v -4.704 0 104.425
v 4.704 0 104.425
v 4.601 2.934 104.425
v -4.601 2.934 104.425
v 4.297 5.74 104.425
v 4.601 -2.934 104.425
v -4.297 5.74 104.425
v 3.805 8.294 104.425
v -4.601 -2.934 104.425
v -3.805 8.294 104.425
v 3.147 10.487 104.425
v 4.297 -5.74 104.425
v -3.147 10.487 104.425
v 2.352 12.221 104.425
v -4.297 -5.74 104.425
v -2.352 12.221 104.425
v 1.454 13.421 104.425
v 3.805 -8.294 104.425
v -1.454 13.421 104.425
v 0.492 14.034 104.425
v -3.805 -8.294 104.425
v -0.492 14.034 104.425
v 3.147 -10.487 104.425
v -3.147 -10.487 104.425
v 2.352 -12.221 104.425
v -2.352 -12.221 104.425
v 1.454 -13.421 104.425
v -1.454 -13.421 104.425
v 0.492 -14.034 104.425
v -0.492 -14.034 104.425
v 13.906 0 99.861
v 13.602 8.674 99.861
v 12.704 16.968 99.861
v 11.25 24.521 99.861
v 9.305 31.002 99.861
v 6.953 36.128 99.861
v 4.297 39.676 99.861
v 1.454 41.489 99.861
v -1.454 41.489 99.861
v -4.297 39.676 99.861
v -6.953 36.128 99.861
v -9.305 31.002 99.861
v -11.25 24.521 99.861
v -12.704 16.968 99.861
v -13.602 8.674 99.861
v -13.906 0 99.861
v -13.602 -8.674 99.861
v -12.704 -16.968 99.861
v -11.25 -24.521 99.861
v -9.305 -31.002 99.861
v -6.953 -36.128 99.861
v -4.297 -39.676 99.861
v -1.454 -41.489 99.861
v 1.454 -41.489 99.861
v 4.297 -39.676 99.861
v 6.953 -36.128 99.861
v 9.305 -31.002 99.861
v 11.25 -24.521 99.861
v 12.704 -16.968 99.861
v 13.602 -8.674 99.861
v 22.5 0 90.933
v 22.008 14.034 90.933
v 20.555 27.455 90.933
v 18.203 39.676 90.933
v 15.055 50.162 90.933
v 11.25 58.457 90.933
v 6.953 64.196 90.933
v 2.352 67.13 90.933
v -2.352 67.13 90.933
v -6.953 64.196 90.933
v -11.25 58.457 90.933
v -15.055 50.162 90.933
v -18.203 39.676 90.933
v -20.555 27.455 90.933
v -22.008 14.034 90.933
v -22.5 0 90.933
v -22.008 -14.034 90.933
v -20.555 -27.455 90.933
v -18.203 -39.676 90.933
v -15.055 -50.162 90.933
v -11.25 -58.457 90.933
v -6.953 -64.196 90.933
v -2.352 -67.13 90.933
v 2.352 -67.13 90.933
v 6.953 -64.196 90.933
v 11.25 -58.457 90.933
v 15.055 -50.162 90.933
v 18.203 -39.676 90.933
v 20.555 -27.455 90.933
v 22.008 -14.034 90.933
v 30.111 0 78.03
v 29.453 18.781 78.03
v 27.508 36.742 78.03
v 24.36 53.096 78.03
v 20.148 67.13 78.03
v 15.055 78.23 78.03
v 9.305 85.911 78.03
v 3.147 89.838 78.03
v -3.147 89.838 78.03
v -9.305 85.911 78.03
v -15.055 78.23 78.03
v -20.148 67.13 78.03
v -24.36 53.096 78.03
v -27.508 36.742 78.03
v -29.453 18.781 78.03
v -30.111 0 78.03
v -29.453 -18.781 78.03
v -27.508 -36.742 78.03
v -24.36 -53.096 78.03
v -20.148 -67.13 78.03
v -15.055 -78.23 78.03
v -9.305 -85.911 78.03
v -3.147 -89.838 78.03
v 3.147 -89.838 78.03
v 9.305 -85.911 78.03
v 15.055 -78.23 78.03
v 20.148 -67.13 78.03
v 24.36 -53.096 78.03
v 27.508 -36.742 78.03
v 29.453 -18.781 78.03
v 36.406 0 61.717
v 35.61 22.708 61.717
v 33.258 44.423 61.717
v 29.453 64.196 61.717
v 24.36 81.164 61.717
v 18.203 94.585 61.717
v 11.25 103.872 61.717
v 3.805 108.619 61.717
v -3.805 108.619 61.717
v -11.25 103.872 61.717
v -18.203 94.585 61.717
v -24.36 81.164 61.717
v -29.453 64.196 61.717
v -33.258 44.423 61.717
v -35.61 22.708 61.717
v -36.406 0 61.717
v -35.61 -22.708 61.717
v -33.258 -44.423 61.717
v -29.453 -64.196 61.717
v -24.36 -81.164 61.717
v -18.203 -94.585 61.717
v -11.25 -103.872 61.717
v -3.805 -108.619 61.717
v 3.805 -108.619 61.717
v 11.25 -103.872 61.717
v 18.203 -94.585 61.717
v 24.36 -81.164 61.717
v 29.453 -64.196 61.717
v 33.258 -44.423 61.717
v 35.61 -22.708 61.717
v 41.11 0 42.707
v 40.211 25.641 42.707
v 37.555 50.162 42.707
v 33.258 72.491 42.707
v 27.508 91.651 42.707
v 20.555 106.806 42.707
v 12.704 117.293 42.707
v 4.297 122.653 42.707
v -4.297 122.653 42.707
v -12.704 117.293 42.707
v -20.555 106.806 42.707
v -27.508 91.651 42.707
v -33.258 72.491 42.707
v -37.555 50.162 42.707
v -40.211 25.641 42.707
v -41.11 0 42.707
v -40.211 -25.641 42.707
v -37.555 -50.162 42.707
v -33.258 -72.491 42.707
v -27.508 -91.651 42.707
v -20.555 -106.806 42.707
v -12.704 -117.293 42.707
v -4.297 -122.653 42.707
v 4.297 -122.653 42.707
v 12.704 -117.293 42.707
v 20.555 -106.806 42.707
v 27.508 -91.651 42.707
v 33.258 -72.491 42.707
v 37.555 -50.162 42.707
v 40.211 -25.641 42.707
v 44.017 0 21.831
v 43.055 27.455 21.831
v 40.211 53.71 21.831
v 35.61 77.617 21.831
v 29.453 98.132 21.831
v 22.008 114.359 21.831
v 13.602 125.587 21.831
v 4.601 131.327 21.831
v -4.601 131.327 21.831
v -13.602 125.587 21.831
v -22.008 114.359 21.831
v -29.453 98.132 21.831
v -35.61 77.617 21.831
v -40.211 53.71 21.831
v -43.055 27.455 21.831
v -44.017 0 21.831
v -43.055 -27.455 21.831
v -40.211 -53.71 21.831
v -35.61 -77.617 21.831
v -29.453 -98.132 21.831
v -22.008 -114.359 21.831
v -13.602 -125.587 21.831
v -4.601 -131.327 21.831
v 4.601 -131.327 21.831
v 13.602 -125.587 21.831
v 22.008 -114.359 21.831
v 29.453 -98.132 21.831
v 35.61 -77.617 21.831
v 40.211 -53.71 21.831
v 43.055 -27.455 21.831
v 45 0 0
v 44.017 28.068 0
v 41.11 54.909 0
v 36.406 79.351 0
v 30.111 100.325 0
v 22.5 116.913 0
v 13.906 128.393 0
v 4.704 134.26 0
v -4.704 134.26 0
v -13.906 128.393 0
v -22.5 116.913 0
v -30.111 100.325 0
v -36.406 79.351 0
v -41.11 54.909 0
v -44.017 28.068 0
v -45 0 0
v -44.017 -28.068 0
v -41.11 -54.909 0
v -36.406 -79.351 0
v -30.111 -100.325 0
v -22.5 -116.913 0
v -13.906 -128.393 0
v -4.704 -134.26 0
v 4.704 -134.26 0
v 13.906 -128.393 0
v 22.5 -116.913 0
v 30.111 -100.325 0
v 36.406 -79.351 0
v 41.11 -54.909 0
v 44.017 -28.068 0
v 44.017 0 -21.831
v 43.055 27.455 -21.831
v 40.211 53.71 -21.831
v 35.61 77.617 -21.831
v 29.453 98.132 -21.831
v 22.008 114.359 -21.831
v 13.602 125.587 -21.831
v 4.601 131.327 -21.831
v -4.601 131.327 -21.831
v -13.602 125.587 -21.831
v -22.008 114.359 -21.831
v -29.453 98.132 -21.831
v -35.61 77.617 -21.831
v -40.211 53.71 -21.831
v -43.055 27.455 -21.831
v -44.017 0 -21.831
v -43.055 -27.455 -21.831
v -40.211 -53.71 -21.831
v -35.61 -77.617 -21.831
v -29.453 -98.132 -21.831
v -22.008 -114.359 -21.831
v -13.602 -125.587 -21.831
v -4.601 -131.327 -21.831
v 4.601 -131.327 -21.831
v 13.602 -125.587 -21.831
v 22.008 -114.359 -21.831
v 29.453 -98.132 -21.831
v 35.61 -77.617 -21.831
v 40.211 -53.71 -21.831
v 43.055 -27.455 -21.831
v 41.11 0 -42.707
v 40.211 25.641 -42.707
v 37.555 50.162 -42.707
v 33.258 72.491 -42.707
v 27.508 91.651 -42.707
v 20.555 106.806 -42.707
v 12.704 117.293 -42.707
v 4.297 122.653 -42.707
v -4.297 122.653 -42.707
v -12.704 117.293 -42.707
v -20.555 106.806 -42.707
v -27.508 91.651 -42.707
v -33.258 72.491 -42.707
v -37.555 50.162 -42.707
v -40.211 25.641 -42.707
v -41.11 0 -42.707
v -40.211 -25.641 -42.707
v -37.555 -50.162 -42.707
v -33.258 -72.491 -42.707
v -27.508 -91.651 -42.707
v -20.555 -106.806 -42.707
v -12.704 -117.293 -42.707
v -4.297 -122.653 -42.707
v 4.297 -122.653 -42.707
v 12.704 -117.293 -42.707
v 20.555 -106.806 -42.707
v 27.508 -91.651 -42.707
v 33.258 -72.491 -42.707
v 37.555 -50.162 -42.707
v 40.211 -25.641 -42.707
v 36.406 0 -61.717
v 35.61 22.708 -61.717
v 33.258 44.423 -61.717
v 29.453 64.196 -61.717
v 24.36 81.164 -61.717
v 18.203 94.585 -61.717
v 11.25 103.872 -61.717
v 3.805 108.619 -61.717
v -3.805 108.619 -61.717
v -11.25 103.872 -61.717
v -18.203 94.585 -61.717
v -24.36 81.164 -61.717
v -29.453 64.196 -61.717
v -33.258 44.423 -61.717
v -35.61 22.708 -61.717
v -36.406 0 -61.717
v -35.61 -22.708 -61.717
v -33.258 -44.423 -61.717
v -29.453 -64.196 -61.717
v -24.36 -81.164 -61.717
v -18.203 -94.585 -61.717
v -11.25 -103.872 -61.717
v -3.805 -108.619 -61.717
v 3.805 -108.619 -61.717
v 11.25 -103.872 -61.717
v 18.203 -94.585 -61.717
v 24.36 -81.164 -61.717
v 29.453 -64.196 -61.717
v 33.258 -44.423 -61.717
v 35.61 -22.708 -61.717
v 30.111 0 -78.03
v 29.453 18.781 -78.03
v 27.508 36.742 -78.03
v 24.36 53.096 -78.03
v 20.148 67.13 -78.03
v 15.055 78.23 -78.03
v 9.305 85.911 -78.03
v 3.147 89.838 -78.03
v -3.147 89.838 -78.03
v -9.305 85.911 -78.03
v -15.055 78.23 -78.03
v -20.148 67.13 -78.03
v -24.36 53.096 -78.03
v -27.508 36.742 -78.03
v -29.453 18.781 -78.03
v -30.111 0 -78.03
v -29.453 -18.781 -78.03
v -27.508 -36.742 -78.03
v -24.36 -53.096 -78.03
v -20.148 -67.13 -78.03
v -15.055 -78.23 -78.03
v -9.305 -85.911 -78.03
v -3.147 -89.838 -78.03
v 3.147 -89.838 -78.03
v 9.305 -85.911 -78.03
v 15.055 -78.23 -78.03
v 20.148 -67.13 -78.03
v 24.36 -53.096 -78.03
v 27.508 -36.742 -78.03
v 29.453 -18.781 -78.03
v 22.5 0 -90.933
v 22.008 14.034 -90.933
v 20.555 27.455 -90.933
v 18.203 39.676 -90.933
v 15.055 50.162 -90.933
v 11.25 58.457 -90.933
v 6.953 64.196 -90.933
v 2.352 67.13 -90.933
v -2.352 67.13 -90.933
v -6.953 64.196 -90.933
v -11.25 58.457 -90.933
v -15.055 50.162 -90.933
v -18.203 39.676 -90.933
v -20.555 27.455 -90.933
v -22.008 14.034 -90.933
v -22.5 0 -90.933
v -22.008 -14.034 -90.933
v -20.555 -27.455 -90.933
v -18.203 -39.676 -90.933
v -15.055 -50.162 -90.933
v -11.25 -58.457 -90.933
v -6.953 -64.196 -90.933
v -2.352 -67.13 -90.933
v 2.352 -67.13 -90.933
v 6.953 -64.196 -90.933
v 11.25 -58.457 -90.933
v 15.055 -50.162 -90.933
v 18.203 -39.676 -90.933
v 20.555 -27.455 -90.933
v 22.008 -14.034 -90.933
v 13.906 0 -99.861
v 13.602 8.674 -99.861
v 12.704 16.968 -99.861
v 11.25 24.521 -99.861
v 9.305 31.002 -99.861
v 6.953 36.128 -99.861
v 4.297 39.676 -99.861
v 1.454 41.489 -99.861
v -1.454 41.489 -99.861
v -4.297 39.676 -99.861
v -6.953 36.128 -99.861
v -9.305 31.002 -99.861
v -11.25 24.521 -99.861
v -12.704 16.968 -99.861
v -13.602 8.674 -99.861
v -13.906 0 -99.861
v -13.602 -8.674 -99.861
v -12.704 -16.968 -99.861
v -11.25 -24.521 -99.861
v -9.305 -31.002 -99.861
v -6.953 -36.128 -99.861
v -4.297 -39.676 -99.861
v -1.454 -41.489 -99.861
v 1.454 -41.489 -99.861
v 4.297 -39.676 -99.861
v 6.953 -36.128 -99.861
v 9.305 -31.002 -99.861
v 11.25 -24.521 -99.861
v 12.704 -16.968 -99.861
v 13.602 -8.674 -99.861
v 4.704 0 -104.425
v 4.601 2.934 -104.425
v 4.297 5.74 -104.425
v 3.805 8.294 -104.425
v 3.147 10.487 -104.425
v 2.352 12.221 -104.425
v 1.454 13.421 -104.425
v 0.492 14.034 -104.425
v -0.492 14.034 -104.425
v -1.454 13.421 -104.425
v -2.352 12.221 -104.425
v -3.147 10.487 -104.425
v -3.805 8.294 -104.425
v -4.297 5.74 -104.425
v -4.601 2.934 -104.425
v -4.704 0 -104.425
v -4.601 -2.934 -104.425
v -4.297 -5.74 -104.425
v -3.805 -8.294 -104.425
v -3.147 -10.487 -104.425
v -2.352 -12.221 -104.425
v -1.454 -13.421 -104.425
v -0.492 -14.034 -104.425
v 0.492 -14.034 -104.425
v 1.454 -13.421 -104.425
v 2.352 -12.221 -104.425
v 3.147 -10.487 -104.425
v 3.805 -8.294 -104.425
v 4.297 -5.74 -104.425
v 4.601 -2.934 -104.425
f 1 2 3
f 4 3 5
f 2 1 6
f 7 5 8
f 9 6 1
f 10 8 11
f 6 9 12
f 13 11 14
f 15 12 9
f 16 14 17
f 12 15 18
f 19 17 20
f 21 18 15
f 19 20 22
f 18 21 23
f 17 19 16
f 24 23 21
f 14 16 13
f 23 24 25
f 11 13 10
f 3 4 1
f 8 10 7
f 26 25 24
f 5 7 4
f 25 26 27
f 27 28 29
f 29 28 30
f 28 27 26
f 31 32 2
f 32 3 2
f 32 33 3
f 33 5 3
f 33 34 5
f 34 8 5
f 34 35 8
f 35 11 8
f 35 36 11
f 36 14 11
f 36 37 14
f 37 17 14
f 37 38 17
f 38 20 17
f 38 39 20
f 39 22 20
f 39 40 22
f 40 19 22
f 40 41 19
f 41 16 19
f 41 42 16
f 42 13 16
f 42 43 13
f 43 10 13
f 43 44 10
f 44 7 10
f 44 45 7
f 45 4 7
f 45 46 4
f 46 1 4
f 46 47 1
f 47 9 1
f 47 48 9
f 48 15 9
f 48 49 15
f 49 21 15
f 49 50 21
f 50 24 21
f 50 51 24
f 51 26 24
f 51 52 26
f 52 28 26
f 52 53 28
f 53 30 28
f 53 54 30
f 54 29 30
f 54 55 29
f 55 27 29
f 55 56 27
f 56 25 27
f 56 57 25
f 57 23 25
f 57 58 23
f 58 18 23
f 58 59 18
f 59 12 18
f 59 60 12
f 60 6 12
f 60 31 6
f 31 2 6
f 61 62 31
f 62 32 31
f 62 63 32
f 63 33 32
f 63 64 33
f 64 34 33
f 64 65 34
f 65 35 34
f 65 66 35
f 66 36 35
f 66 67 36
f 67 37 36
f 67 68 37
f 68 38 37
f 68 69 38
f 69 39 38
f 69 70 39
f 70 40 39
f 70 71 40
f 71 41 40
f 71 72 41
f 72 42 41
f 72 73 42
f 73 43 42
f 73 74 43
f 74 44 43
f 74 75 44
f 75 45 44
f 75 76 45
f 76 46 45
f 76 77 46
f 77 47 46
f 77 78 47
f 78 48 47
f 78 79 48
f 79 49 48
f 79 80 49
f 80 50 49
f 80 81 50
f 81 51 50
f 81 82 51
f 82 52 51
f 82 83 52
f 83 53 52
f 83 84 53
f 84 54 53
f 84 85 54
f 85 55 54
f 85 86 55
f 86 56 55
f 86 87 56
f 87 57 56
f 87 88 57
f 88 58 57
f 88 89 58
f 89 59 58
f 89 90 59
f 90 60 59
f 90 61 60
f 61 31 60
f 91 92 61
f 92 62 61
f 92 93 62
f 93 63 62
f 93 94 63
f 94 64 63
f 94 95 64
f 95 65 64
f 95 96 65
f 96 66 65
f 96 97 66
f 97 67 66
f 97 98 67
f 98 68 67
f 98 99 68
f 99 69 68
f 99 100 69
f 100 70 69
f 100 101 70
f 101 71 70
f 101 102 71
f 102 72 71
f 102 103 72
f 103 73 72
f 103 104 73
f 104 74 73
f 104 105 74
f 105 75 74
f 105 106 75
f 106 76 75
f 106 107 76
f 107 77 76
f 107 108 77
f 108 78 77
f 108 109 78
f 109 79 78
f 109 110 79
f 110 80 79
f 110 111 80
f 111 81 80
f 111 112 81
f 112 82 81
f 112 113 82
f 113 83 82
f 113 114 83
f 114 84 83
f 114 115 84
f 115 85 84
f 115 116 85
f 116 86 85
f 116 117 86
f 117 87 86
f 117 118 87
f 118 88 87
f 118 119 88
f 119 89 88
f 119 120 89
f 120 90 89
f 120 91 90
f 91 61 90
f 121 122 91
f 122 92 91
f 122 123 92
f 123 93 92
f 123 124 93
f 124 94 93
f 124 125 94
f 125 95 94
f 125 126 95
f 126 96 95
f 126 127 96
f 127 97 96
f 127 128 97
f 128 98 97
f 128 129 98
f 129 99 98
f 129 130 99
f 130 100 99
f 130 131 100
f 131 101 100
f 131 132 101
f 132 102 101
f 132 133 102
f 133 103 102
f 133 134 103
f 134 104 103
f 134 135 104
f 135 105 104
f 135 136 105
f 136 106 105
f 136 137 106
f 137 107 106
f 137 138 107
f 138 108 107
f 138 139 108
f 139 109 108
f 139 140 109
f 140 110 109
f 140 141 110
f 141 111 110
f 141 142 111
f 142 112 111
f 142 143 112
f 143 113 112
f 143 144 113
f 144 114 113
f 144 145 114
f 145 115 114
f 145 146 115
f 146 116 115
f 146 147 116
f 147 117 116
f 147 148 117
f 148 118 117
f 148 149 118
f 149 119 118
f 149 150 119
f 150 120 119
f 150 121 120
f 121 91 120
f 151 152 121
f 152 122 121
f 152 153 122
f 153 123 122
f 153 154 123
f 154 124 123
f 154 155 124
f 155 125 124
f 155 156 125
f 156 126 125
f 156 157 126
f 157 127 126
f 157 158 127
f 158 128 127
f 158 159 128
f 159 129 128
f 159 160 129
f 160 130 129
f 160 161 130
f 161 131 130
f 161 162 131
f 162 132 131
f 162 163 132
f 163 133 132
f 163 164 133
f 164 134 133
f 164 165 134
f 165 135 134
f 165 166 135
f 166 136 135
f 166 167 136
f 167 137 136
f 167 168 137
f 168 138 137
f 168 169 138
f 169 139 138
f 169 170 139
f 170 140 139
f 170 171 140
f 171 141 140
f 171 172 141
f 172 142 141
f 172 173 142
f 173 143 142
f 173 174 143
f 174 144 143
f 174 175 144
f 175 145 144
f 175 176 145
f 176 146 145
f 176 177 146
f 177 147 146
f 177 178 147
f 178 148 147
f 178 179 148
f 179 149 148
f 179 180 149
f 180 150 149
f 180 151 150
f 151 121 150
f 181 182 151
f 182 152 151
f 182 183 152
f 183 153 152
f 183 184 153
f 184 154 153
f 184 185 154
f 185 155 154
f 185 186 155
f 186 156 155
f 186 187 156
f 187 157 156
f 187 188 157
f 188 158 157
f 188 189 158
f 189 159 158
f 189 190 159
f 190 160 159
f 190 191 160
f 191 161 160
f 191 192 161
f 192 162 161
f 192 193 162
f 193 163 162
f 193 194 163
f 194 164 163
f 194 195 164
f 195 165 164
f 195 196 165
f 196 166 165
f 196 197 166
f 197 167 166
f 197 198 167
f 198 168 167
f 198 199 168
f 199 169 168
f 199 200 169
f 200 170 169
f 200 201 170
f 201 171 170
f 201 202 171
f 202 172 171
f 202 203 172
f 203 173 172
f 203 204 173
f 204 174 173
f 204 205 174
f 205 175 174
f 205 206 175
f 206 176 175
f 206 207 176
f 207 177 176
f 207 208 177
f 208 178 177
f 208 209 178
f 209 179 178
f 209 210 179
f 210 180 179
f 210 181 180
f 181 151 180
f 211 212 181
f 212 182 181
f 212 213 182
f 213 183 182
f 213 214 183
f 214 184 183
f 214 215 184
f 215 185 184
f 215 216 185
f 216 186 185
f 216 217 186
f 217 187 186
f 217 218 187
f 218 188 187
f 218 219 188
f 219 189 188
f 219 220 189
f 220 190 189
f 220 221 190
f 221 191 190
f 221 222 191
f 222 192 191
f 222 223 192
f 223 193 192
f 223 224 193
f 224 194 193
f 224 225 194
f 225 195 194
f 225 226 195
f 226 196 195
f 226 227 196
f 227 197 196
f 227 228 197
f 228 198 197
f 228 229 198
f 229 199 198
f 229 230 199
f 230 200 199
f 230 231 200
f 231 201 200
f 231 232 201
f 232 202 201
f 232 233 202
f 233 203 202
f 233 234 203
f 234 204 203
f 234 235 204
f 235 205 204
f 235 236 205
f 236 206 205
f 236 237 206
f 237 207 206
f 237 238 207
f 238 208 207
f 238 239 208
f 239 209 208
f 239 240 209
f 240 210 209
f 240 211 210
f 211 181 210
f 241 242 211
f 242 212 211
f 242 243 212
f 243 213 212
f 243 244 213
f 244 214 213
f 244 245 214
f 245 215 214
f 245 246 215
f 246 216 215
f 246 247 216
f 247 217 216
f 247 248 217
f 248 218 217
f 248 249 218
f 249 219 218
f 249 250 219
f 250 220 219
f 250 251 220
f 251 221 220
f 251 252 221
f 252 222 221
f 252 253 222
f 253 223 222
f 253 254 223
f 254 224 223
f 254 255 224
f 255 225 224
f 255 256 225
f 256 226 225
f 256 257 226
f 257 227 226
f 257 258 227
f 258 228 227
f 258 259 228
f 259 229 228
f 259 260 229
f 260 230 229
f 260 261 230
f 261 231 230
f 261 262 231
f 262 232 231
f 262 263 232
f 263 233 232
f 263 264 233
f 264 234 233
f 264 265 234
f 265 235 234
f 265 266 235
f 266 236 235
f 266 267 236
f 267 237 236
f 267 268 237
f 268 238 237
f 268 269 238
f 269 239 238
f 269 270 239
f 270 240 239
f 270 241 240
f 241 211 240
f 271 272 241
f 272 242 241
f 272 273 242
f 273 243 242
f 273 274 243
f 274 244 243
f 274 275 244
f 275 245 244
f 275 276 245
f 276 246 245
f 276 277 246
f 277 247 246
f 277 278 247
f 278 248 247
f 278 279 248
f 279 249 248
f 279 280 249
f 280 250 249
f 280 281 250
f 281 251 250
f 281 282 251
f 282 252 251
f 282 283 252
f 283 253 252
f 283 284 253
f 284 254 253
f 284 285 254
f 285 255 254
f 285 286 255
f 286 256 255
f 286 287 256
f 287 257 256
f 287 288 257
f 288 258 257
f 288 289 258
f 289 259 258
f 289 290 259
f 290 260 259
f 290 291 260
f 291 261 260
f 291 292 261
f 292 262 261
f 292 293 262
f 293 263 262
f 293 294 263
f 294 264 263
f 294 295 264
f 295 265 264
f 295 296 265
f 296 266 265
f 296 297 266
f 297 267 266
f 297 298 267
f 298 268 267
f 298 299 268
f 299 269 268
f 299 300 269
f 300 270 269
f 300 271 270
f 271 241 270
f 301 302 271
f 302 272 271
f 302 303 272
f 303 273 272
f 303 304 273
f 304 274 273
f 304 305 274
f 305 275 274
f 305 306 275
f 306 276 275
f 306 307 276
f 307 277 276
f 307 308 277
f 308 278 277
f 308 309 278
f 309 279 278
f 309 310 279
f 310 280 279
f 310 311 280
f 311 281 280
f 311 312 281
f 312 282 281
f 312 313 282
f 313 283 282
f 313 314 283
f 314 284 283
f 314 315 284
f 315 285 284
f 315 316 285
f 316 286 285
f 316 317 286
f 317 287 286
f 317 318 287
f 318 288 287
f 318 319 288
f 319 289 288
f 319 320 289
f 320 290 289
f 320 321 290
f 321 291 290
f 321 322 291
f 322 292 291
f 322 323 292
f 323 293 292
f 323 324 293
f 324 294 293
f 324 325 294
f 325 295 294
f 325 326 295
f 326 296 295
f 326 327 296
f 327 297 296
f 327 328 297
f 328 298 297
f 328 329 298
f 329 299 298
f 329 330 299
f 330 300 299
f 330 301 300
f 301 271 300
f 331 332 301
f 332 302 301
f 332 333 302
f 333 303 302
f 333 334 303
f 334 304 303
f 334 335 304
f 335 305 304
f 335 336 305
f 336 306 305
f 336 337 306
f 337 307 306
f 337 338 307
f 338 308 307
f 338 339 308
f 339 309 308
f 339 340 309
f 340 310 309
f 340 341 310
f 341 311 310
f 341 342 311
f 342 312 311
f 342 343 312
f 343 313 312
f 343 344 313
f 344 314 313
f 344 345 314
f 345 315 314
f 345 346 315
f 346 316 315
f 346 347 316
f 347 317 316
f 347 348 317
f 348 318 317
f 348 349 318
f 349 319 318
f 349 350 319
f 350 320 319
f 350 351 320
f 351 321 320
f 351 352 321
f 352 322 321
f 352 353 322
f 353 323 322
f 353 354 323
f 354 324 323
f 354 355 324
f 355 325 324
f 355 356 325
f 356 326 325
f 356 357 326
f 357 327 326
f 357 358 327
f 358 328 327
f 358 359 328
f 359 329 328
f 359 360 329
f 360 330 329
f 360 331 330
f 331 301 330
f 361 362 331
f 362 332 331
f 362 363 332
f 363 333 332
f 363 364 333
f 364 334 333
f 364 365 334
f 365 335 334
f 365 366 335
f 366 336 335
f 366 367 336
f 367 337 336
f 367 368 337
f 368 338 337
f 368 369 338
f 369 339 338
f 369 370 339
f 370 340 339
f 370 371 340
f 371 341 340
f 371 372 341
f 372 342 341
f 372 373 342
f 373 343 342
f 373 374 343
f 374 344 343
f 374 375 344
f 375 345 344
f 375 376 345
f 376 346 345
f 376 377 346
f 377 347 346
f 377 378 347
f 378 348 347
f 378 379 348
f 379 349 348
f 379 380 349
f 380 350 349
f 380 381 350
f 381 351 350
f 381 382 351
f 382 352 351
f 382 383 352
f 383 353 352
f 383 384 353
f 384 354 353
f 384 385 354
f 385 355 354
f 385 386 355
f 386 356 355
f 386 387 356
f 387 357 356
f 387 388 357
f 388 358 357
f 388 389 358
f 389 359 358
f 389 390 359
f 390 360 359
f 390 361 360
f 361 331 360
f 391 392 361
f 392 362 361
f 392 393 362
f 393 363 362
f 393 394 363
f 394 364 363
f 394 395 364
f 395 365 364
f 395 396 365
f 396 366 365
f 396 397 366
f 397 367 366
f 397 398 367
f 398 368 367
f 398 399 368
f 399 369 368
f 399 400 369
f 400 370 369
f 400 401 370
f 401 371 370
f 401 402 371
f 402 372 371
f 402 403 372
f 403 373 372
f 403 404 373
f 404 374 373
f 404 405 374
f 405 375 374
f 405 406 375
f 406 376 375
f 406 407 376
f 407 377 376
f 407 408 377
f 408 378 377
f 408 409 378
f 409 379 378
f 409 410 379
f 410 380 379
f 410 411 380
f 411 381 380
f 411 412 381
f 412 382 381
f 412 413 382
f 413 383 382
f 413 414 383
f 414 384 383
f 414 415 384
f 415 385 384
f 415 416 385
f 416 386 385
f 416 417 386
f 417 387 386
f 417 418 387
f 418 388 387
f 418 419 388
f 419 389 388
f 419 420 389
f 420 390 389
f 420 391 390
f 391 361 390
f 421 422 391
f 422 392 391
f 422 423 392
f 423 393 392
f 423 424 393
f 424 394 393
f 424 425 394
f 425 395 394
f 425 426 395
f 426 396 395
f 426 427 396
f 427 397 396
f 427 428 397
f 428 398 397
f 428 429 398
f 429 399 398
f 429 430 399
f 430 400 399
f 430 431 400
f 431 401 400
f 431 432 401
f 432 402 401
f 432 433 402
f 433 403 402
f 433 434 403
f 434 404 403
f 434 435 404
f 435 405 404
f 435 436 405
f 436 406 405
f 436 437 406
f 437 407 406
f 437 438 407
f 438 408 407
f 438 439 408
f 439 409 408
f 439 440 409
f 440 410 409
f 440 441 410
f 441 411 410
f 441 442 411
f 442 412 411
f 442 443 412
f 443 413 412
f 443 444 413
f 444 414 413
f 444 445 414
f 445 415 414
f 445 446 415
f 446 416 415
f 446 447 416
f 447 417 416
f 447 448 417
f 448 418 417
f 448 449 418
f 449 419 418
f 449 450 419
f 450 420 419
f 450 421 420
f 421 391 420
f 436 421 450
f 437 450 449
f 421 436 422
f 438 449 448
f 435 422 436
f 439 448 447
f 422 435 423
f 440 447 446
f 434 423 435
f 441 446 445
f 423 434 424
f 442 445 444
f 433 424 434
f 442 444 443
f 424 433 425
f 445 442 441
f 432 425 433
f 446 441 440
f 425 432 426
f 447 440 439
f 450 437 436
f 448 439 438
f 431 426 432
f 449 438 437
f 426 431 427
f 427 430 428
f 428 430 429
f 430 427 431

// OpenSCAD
// Generated by SolidPython 1.0.1 on 2020-07-29 00:46:45


scale(v = [3, 9, 7]) {
	sphere(r = 15);
}
/***********************************************
*********      SolidPython code:      **********
************************************************
 
# import packages: SolidPython
from solid import *
from solid.utils import *
from itertools import chain, combinations, permutations


class Resize:

    def __init__(self, scad_file):
        self.scad_file = scad_file
        #self.scad_file = import_scad(scad_file)
        # cone/cylinder param:
        self.r1 = 0
        self.r2 = 0
        self.h = 0
        # rectangular prism param:
        self.w = 0
        self.l = 0
        # ellipse param:
        self.r = 0

    # import OpenScad code (file name corresponds to shape)


    # classify shape + parameters
    def assign(self, param1, param2, param3):
        if self.scad_file == 'cone.scad':
            self.r1 = param1
            self.r2 = param2
            self.h = param3
        elif self.scad_file == 'cylinder.scad':
            self.r1 = param1
            self.r2 = param2
            self.h = param3
        elif self.scad_file == 'rectangularPrism.scad':
            self.h = param1
            self.l = param2
            self.w = param3
        else:
            self.r = param1
            self.h = param2

    # resize parameters
    def iterate(self):
        x = range(3, 20, 2)
        i = 1
        if self.scad_file == 'cone.scad':
            tempList = list(permutations(x, 2))
            for temp in tempList:
                param1 = temp[0]
                param2 = temp[1]
                filepath = 'produced_scad_files/' + 'cone' + str(param1) + '_' + str(param2) + '_' + '.scad'
                scad_render_to_file(cylinder(h=param1, r1=param2, r2=0), filepath)

        elif self.scad_file == 'cylinder.scad':
            tempList = list(permutations(x, 3))
            for temp in tempList:
                param1 = temp[0]
                param2 = temp[1]
                filepath = 'produced_scad_files/' + 'cylinder' + str(param1) + '_' + str(param2) + '_' + '.scad'
                scad_render_to_file(cylinder(h=param1, r1=param2, r2=param2), filepath)

        elif self.scad_file == 'rectangularPrism.scad':
            tempList = list(permutations(x, 3))
            for temp in tempList:
                param1 = temp[0]
                param2 = temp[1]
                param3 = temp[2]
                filepath = 'produced_scad_files/' + 'rectangularPrism' + str(param1) + '_' + str(param2) + '_' + str(
                    param3) + '.scad'
                scad_render_to_file(cube(size=(param1, param2, param3)), filepath)

        elif self.scad_file == 'ellipse.scad':
            tempList = list(permutations(x, 4))
            for temp in tempList:
                param1 = temp[0]
                param2 = temp[1]
                param3 = temp[2]
                param4 = temp[3]
                filepath = 'produced_scad_files/' + 'ellipse' + str(param1) + '_' + str(param2) + '_' + str(param3) + '_' + str(param4) + '.scad'
                scad_render_to_file(scale([param1, param2, param3])(sphere(r=param4)), filepath)

    def render_to_scadfile(self):
        scad_render_to_file(scad, 'example.scad') 
 
************************************************/
